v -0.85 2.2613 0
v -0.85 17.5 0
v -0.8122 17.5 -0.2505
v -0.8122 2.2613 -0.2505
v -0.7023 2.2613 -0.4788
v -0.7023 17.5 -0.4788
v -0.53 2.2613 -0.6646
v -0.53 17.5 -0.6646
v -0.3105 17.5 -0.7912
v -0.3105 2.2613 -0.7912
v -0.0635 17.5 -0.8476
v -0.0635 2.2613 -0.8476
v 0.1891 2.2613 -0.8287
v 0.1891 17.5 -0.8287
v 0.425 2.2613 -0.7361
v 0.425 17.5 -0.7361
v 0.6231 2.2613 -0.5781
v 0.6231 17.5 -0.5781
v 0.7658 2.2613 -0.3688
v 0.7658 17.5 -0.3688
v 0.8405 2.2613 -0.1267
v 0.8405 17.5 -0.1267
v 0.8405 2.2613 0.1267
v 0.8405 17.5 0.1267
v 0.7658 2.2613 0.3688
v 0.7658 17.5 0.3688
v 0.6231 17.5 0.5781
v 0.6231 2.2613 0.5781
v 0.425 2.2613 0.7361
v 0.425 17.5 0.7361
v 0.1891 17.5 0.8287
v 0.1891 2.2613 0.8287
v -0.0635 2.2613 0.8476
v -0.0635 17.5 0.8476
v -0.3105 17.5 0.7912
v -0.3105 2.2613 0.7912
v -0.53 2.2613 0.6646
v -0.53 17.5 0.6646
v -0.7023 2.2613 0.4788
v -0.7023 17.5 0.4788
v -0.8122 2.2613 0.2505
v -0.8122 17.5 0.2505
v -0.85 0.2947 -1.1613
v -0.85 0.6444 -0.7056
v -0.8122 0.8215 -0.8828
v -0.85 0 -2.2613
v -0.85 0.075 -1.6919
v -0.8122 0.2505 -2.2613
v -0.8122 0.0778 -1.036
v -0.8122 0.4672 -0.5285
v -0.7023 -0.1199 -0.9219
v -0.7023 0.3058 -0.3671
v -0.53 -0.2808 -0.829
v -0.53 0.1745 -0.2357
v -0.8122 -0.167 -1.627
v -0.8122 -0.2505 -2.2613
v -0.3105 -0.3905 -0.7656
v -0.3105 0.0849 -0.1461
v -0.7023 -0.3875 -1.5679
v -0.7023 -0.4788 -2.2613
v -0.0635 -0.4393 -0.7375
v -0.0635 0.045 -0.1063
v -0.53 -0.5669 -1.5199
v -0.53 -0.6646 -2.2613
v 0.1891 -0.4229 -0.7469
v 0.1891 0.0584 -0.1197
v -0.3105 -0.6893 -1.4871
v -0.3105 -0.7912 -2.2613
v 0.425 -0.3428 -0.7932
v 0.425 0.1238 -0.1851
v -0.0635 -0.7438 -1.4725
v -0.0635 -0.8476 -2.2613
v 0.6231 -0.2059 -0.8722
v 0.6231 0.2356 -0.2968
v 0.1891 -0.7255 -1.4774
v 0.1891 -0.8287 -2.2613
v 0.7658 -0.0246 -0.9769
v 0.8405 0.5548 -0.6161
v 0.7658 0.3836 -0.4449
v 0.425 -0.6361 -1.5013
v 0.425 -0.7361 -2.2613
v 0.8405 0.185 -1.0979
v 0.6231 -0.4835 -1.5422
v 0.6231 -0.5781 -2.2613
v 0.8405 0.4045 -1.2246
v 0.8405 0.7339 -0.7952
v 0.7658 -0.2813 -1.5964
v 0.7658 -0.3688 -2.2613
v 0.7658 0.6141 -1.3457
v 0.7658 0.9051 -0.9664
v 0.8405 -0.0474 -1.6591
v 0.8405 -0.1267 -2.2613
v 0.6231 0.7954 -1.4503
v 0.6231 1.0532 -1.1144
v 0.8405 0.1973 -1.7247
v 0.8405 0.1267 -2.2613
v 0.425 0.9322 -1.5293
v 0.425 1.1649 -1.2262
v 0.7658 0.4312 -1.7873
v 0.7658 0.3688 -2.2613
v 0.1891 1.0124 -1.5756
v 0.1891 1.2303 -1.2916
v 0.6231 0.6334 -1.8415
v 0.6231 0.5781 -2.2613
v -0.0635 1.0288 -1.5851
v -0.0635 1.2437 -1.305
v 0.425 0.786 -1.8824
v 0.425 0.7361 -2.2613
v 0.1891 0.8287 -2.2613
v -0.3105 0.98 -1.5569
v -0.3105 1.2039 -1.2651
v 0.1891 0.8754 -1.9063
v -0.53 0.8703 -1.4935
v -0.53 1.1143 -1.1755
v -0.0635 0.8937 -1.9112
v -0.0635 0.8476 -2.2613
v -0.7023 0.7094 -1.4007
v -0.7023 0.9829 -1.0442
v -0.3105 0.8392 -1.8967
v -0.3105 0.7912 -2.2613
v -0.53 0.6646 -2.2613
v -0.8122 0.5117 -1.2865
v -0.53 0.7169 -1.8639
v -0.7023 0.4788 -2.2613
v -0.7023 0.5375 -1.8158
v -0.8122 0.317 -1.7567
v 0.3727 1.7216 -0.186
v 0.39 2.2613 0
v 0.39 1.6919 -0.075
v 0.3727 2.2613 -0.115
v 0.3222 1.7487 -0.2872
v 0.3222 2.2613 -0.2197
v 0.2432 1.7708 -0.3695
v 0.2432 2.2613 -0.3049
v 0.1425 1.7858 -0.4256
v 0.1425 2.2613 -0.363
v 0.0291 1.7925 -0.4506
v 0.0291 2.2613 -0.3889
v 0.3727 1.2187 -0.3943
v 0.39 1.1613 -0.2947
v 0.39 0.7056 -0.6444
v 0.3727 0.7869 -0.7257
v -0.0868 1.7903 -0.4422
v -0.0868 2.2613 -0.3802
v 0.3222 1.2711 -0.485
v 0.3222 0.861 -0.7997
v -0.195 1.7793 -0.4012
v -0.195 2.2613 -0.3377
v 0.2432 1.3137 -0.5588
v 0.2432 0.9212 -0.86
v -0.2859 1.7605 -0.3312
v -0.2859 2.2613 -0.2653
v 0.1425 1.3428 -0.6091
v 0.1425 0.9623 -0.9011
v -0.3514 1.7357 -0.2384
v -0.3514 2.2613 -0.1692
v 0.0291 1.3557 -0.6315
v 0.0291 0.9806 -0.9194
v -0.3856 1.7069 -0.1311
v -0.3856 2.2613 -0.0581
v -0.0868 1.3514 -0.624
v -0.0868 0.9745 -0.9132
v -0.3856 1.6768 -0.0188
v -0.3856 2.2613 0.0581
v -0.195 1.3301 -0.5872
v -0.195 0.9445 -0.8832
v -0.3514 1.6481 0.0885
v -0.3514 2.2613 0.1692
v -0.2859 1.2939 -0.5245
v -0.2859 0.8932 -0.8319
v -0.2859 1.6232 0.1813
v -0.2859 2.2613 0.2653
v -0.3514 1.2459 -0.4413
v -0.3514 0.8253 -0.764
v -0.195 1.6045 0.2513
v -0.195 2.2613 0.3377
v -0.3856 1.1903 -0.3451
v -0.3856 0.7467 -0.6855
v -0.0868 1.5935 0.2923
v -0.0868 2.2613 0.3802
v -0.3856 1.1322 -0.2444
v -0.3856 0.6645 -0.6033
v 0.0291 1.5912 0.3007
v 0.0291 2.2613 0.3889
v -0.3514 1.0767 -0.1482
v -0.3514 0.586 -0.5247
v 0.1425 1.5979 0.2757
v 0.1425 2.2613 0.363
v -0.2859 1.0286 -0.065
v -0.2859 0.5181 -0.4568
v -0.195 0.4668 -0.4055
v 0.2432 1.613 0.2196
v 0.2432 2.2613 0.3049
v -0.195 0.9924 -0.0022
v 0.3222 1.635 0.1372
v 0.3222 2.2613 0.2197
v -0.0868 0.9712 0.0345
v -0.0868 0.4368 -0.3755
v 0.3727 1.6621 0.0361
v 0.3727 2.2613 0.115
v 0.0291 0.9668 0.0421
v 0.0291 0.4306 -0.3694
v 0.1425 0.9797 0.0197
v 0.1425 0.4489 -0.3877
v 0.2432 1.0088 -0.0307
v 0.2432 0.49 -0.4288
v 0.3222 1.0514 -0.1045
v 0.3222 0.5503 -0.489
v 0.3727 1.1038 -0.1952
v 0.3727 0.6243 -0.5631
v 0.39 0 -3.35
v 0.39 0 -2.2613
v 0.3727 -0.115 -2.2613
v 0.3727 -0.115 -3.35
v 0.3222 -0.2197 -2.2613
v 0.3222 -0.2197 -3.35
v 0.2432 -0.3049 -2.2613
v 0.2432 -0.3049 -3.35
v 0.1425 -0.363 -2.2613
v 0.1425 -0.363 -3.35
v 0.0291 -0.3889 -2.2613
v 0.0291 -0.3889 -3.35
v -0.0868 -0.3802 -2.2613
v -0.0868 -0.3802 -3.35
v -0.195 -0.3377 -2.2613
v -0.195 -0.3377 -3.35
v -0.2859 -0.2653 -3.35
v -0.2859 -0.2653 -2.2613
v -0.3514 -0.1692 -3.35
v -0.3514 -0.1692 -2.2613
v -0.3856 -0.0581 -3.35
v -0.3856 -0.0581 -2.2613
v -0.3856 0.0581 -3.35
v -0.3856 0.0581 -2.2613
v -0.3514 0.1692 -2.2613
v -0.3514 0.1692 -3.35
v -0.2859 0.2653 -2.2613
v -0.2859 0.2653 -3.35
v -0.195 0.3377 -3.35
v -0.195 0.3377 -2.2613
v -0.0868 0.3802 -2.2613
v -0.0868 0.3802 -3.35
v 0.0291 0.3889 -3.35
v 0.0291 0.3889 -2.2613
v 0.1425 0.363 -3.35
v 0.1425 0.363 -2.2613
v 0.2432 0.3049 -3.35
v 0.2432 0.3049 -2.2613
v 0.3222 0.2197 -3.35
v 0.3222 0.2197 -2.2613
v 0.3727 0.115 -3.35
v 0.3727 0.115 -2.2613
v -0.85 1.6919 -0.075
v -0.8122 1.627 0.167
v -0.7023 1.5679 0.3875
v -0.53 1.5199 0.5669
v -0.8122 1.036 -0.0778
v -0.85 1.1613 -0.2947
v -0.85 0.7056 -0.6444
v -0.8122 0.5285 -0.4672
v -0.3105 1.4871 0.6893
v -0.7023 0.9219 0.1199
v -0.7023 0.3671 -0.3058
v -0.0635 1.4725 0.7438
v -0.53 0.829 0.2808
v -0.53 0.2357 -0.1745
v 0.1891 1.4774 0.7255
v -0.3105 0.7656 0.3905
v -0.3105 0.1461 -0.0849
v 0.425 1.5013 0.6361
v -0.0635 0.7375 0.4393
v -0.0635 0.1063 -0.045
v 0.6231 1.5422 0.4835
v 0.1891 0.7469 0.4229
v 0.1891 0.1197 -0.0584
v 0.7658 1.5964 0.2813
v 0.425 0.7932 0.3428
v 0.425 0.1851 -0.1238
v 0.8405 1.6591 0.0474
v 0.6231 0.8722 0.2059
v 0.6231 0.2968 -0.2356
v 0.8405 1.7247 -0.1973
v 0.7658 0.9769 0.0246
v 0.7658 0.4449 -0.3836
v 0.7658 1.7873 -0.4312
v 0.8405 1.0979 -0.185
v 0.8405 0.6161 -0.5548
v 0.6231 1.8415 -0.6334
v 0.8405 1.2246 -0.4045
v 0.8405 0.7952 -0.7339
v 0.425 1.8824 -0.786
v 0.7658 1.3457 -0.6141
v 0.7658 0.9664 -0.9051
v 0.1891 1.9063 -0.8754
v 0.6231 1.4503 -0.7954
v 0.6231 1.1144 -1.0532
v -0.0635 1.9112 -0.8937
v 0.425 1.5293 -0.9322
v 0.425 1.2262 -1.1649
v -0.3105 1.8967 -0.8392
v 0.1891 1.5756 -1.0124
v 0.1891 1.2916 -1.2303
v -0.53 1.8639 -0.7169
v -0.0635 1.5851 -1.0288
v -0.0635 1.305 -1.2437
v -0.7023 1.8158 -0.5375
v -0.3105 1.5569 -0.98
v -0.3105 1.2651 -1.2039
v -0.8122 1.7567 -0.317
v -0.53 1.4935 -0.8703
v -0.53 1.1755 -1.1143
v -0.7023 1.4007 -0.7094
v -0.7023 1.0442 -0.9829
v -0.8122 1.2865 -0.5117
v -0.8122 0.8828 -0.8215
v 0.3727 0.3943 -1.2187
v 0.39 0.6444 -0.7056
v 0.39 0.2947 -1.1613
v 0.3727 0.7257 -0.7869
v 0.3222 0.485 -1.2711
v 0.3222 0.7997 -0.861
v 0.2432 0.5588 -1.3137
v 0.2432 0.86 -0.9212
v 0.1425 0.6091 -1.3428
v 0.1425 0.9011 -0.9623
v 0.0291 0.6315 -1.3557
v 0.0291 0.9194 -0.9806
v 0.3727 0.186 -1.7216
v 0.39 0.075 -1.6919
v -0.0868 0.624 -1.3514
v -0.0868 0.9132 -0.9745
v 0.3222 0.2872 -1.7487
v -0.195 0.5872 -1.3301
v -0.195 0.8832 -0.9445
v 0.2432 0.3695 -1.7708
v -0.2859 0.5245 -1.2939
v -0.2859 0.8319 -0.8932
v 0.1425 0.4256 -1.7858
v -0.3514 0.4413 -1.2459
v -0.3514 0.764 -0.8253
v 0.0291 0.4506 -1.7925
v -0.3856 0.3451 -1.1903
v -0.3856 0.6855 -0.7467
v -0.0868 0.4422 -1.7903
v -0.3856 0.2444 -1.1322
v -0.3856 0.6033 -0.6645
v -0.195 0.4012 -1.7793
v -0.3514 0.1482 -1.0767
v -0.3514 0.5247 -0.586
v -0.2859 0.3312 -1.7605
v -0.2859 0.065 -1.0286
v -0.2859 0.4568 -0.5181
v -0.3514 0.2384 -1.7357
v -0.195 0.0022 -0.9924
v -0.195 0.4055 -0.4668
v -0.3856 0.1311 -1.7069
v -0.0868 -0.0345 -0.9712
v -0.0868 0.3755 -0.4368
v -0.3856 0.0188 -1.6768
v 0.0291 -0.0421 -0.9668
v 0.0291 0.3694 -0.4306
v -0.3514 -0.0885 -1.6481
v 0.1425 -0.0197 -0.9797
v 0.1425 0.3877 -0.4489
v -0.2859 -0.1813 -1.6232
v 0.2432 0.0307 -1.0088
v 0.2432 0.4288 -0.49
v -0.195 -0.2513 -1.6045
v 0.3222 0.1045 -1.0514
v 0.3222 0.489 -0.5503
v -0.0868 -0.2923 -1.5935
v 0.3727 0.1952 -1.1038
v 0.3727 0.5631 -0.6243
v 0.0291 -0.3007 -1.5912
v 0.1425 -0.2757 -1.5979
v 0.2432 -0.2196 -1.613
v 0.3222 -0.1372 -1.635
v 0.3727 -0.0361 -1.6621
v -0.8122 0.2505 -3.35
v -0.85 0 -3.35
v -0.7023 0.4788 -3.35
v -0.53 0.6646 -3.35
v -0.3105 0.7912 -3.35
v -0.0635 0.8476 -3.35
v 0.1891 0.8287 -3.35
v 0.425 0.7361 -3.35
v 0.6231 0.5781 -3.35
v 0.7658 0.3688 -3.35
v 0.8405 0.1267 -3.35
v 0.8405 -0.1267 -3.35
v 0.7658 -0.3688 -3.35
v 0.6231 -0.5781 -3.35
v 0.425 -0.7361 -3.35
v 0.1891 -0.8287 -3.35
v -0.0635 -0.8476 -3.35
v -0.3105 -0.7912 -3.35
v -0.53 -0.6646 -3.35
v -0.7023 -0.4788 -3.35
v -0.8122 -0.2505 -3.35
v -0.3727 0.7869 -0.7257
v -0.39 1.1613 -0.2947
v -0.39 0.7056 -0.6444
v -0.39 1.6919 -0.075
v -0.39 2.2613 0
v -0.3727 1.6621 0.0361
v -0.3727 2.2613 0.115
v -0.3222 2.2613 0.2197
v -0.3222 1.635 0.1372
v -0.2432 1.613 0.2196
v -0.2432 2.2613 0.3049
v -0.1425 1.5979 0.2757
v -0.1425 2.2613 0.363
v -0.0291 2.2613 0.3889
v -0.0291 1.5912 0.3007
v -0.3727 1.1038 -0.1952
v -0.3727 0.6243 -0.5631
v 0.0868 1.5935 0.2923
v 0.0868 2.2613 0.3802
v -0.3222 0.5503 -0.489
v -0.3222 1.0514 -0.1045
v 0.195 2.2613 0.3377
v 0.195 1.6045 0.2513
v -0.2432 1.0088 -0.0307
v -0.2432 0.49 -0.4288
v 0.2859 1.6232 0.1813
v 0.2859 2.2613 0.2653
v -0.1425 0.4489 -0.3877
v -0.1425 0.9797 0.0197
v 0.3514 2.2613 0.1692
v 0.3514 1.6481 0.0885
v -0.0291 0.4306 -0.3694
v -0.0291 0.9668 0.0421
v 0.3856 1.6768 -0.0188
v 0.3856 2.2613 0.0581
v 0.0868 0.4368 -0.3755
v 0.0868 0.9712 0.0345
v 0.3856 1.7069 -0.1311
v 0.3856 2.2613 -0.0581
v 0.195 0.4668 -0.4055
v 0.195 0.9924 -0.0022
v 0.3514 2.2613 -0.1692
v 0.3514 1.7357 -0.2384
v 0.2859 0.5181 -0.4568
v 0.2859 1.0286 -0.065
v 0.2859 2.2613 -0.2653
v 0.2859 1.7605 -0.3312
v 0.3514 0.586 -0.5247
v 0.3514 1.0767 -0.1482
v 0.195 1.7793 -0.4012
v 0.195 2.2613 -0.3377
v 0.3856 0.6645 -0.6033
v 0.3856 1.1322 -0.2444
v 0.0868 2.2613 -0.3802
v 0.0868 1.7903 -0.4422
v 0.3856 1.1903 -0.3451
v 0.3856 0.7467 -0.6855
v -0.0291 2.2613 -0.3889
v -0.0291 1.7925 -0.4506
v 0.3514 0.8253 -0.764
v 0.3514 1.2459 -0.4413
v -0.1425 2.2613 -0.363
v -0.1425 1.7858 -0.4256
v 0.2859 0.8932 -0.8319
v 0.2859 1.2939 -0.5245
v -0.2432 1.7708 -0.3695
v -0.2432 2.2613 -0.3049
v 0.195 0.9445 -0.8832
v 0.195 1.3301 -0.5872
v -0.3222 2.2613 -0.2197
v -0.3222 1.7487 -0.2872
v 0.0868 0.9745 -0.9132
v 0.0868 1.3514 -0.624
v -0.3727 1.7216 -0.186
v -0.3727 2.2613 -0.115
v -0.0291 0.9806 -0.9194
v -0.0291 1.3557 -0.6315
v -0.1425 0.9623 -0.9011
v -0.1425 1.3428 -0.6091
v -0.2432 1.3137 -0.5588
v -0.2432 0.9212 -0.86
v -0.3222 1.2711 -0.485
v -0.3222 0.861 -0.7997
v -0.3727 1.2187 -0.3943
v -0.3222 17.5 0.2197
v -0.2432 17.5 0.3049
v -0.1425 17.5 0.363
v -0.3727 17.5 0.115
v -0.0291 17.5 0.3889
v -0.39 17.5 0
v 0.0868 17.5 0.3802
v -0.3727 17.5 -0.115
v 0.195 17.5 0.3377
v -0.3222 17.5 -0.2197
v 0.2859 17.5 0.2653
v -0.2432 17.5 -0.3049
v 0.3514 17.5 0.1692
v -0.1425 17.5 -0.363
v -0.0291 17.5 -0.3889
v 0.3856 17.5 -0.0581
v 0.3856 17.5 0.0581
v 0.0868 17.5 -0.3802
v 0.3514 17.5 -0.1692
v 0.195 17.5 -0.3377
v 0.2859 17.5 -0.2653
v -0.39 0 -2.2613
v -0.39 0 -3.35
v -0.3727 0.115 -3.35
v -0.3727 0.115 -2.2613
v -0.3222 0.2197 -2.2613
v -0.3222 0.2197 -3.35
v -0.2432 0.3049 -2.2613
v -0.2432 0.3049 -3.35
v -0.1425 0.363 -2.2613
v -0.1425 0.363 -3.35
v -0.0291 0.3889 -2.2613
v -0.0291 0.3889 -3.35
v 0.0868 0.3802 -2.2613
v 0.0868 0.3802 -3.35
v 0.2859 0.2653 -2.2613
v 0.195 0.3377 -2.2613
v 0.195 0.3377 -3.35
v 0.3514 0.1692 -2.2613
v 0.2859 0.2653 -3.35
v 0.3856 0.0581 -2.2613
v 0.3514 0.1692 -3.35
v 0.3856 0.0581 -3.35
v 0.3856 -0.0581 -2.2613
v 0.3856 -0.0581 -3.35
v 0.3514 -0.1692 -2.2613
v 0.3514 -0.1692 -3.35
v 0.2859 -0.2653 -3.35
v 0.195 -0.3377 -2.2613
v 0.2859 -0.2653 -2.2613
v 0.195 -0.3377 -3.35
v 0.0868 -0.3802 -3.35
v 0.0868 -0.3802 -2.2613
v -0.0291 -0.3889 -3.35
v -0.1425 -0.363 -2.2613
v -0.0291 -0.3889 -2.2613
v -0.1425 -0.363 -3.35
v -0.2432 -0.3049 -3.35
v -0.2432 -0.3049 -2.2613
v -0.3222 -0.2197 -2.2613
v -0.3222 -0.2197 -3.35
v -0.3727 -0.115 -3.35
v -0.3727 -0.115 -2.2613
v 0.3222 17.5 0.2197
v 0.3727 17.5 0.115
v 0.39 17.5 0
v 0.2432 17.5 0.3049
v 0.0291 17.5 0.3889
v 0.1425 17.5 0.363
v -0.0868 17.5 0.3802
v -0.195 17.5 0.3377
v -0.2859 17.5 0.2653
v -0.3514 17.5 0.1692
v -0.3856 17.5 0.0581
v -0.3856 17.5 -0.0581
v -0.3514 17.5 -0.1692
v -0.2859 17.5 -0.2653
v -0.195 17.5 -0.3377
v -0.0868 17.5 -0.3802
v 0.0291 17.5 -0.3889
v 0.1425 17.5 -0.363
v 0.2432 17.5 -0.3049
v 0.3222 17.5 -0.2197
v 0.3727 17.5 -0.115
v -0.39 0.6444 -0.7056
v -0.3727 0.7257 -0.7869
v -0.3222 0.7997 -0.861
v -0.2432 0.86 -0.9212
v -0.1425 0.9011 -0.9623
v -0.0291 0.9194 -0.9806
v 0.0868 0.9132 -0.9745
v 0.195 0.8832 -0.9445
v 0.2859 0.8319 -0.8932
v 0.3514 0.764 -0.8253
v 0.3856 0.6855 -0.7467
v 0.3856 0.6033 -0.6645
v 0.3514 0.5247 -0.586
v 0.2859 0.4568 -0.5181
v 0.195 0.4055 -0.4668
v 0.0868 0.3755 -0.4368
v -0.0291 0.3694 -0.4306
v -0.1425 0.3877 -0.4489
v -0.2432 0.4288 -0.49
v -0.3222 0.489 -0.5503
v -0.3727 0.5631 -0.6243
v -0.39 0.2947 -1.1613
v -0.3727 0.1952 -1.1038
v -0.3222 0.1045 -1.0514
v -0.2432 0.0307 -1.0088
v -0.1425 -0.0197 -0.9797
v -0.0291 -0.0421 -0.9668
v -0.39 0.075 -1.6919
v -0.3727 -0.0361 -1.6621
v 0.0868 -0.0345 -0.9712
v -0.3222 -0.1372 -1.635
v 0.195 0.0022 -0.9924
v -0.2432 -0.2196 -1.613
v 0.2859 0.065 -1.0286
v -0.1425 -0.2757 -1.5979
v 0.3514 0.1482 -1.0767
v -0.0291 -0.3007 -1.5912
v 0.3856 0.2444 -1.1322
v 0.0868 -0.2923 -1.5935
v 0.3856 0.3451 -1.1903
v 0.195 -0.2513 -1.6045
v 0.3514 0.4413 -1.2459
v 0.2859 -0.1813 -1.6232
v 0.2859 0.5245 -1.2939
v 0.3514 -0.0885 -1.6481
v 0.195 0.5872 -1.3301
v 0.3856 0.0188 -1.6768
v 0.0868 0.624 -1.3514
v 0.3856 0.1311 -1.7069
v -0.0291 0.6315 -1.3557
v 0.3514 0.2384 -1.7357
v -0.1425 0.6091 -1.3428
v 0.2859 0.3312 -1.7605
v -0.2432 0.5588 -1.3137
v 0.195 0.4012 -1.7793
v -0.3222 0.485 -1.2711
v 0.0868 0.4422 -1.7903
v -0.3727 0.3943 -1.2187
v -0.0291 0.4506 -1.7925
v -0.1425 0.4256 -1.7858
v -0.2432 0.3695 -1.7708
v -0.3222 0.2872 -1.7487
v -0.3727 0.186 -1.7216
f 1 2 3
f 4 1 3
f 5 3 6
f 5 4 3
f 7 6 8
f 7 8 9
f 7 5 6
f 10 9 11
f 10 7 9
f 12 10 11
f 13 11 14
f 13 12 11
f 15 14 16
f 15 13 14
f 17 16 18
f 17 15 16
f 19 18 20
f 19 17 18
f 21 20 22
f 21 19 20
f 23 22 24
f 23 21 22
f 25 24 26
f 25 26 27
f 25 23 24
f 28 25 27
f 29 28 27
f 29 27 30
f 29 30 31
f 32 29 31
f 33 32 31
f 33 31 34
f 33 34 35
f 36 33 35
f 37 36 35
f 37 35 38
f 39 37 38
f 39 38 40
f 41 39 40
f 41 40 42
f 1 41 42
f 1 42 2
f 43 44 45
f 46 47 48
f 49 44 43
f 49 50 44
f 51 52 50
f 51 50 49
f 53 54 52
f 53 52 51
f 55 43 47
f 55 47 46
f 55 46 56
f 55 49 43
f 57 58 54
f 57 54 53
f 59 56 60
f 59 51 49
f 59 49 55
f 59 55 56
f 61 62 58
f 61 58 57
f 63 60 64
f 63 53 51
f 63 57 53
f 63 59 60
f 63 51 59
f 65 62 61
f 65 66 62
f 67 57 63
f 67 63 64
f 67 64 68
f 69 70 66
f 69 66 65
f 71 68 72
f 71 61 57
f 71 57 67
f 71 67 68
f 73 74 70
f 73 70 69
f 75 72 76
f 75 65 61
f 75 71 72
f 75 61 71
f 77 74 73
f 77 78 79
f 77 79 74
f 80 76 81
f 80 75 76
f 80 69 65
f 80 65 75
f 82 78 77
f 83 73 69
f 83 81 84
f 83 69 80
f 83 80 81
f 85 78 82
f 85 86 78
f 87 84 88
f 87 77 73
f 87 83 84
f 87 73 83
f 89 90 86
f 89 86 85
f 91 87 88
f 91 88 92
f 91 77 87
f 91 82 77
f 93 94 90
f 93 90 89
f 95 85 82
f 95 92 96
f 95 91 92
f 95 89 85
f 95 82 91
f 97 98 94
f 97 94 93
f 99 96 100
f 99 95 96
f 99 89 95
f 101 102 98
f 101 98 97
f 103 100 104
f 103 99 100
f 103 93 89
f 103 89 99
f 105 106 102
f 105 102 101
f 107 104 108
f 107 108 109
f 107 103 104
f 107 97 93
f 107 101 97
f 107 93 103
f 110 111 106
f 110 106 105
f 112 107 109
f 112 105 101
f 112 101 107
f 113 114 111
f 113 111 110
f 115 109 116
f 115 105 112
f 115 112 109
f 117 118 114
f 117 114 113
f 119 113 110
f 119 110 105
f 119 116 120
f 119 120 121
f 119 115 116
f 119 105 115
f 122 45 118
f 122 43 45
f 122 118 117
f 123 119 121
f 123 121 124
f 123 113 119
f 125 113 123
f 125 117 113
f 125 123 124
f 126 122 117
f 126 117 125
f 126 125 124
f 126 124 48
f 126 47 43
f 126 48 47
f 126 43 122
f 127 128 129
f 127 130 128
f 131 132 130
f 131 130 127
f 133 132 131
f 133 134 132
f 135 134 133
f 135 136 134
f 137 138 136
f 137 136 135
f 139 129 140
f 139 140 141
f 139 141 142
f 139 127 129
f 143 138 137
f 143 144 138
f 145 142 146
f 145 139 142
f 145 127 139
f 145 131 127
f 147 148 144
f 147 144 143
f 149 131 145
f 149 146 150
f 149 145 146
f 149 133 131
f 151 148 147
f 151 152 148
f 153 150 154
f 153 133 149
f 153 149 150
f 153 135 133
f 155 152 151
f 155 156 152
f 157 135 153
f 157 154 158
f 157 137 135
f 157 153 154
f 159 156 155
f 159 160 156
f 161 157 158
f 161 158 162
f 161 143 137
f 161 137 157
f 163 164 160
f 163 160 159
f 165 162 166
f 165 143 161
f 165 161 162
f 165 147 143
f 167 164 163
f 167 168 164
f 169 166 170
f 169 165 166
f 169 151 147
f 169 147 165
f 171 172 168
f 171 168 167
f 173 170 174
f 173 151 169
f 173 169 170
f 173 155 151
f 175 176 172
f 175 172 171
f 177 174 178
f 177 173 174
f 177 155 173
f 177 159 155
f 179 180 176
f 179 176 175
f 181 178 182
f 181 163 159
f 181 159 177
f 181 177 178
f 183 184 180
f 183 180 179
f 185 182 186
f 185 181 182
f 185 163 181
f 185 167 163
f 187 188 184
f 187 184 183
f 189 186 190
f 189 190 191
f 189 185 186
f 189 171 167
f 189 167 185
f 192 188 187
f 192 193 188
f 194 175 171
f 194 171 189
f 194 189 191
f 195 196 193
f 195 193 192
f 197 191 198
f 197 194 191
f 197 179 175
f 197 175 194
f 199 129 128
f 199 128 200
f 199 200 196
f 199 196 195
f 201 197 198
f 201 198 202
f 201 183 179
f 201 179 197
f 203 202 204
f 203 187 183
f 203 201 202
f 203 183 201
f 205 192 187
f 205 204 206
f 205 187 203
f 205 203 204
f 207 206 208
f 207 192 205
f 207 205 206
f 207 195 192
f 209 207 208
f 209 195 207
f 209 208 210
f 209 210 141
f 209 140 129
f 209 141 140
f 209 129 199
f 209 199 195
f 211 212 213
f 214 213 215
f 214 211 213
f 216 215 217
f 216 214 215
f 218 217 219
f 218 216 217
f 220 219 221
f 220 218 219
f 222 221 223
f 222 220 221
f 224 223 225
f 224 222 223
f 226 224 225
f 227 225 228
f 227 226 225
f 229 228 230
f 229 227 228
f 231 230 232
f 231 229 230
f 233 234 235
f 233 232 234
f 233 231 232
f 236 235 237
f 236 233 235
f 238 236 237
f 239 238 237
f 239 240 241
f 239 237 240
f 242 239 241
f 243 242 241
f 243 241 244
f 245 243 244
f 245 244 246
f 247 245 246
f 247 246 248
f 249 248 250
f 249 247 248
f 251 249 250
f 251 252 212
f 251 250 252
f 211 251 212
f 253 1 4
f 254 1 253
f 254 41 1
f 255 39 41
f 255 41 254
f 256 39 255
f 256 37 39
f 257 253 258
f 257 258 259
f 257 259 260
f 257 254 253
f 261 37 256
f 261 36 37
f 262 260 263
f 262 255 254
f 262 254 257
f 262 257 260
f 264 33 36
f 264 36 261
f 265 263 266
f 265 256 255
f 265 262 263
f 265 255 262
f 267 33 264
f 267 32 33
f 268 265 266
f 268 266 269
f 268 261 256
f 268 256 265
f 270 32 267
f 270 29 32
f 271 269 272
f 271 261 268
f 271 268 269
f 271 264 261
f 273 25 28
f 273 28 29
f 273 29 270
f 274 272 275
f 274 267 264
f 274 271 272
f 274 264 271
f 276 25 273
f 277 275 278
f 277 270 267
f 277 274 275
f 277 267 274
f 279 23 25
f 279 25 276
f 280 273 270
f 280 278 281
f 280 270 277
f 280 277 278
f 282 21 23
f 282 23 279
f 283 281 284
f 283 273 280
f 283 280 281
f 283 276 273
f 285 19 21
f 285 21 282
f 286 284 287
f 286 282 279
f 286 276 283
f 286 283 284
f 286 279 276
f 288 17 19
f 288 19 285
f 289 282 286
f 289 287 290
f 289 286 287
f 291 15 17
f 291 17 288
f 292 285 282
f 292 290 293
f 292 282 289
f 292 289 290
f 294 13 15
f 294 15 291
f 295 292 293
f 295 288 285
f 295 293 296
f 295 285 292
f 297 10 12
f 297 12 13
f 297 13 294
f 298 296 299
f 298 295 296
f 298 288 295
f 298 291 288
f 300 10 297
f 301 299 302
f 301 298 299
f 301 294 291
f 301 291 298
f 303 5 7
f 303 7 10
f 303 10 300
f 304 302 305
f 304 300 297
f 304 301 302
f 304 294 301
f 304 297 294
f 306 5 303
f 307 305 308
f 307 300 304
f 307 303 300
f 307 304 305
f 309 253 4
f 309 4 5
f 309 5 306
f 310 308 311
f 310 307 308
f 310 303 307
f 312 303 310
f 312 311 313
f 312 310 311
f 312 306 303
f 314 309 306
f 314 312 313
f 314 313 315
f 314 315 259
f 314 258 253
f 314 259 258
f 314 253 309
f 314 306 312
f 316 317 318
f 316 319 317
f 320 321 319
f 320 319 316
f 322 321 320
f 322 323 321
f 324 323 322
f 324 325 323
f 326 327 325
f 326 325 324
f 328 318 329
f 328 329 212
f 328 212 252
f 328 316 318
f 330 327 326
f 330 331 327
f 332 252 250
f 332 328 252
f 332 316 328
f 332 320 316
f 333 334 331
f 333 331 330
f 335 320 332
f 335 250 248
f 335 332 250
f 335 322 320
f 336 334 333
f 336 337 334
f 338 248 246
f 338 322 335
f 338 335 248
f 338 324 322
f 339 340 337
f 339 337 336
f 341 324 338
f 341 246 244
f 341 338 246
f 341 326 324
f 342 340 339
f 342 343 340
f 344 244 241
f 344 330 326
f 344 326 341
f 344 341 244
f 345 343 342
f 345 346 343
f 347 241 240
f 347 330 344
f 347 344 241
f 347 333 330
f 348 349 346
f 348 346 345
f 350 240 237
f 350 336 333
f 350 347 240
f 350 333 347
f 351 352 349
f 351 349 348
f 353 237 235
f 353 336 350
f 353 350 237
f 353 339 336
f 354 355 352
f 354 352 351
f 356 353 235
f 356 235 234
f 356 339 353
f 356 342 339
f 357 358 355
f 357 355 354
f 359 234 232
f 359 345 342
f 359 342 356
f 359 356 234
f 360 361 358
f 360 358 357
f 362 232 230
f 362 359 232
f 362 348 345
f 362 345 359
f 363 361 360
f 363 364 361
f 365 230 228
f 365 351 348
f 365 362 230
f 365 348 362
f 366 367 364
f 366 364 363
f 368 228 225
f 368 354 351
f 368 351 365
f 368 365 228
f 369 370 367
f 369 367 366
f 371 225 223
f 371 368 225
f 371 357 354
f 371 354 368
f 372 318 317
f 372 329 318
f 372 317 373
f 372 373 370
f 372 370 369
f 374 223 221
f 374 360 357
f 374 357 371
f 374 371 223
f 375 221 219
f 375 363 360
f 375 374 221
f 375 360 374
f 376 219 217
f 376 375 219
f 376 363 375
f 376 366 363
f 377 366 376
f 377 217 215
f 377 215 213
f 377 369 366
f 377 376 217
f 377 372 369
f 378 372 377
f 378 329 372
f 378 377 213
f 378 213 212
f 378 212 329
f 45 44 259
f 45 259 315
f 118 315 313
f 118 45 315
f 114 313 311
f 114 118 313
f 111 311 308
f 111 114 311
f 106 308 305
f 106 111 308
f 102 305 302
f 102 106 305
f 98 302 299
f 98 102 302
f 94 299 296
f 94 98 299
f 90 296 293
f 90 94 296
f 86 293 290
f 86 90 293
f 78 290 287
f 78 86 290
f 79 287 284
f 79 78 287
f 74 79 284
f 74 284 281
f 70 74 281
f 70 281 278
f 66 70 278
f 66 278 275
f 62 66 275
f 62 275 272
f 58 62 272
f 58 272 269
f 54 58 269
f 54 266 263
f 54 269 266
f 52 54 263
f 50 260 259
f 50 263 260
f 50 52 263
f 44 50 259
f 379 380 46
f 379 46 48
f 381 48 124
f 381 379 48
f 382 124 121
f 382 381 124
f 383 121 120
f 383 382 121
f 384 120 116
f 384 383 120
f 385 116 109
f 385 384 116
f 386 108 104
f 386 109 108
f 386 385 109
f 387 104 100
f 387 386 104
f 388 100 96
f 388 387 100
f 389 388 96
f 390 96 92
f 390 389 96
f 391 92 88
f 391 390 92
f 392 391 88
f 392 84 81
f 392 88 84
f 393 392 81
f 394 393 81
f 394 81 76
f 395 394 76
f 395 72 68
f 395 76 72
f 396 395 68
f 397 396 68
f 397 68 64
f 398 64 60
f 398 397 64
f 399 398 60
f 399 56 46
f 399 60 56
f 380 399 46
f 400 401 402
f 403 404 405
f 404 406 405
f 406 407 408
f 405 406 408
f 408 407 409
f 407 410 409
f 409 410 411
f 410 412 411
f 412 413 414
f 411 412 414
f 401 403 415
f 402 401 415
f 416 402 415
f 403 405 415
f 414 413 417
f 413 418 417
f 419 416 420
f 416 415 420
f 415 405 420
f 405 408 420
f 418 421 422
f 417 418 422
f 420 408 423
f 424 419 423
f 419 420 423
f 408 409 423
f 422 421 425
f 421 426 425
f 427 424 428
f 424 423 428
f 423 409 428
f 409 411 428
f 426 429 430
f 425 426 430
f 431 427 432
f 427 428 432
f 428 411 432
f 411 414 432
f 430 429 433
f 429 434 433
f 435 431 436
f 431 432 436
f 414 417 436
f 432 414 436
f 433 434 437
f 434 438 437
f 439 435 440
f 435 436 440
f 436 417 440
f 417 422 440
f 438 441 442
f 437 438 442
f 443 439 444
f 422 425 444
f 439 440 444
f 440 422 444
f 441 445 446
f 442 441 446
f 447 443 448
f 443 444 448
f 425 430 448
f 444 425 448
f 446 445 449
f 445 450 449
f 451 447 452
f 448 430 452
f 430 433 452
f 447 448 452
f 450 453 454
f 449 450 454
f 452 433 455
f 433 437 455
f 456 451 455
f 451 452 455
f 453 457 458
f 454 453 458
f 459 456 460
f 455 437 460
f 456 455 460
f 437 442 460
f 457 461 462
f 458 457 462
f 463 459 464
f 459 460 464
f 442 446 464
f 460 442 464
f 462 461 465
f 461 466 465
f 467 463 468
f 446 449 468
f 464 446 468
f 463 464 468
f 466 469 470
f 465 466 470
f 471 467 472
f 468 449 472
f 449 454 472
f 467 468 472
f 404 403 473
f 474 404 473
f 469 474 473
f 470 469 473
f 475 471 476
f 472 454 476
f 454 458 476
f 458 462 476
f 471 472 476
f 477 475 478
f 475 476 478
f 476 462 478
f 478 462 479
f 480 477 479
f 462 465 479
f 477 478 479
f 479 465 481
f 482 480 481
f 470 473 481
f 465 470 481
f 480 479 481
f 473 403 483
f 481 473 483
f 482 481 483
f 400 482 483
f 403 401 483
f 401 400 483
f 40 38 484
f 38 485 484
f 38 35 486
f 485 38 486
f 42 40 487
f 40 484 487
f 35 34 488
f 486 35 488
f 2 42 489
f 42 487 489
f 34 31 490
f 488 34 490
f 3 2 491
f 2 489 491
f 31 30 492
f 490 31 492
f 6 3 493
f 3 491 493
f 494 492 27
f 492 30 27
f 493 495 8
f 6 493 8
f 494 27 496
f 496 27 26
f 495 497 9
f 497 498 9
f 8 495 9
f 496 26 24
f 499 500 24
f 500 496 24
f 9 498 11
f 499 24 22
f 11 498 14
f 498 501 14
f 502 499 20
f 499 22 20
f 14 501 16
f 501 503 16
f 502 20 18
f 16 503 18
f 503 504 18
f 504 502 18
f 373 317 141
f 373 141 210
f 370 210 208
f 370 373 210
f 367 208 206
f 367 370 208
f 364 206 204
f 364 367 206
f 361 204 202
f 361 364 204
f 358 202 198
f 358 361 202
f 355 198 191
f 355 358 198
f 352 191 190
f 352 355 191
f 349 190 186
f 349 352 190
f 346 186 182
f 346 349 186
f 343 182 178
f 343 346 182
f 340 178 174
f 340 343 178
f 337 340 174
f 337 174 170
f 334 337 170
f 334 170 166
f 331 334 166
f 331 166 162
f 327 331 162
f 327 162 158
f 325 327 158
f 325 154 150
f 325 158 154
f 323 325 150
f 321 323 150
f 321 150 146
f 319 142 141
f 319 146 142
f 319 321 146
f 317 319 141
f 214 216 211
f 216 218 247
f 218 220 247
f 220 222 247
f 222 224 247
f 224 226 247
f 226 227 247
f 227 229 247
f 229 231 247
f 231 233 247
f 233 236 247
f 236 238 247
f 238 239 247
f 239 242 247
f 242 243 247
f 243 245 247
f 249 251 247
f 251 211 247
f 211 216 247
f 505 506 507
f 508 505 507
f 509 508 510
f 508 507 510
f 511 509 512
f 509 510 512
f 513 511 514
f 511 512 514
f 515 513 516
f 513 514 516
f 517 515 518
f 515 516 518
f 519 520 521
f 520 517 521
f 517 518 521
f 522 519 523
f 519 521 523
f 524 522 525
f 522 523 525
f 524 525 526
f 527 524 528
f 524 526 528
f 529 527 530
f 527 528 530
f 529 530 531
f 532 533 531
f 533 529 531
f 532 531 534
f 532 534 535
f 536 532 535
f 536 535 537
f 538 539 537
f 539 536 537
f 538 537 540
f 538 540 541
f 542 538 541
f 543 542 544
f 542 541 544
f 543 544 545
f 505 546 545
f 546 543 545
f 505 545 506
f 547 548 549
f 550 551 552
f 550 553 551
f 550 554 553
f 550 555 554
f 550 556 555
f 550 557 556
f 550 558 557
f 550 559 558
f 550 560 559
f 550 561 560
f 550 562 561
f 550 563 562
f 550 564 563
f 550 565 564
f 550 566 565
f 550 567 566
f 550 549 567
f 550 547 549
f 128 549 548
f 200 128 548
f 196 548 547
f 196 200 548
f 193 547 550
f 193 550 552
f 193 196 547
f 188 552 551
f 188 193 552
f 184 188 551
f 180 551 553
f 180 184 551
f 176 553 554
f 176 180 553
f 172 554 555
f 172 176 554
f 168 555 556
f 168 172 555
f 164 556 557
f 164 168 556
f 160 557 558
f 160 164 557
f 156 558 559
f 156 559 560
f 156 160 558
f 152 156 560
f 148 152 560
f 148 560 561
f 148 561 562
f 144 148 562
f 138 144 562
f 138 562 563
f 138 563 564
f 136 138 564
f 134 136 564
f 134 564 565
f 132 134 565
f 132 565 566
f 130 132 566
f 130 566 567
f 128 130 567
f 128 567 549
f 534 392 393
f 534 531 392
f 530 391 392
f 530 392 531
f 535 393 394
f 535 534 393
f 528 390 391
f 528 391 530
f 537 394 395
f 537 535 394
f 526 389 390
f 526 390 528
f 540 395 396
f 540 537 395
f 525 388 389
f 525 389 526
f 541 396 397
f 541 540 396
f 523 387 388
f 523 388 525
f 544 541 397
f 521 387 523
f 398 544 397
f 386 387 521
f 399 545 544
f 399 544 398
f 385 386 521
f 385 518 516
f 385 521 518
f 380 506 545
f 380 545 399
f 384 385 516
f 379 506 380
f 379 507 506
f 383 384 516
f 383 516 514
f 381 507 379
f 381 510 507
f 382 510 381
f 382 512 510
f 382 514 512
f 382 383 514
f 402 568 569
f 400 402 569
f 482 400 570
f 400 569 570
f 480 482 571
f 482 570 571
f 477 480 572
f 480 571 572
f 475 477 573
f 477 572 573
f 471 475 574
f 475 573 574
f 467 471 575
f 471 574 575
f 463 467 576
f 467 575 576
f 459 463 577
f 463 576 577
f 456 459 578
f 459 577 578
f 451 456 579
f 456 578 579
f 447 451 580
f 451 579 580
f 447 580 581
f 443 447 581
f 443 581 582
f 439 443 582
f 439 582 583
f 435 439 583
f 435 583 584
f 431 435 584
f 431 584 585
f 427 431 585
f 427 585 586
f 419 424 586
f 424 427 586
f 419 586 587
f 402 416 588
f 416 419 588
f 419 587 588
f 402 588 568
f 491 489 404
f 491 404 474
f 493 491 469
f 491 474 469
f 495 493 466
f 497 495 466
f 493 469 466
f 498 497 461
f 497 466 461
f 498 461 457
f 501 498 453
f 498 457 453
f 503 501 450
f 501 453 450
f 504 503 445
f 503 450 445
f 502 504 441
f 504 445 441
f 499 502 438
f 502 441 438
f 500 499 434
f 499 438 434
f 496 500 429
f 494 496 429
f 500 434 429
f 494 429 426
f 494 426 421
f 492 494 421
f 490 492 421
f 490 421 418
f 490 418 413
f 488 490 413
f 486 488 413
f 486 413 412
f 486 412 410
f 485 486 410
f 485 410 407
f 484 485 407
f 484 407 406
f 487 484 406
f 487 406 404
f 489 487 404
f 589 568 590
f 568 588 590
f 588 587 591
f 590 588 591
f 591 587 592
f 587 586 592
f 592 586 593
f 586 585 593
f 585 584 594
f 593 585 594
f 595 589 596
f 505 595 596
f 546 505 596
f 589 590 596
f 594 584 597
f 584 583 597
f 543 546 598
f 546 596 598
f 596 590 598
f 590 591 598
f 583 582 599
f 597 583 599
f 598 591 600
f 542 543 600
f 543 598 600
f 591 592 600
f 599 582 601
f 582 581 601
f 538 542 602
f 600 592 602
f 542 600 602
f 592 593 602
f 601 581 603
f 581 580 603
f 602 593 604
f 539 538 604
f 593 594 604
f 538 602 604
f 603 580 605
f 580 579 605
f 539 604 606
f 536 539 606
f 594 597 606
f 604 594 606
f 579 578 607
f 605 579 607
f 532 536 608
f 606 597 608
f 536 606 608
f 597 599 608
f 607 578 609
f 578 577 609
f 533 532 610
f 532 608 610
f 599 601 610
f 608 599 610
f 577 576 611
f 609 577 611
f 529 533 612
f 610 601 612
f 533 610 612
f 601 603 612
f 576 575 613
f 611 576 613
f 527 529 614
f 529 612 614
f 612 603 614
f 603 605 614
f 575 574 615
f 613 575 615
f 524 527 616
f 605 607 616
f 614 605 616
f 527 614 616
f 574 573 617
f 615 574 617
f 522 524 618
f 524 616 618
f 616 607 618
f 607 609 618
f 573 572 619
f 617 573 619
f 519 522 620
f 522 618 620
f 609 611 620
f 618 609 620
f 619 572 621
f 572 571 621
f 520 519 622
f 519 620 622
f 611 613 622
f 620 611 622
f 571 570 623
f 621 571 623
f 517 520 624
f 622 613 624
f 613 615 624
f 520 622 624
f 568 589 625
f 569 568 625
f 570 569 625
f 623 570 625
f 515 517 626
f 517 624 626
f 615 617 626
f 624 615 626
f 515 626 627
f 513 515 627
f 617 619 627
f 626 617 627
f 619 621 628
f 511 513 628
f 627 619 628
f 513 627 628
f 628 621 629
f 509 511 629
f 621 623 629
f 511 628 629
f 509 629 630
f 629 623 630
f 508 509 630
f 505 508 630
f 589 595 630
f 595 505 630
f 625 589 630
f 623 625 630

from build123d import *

# Parameters (mm, degrees)
SKETCH_2_R   = 0.39
SKETCH_3_R   = 0.85
SKETCH_3_R_2 = 0.39


with BuildPart() as part:
    # По траектории1: sweep along a path in Эскиз1
    with BuildLine(Plane(origin=(0, 0, 0), x_dir=(0, 0, -1), z_dir=(1, 0, 0))) as sweep_1_path:
        Line((0, 17.49999984), (0, 2.26126984))
        ThreePointArc((0, 2.26126984), (0.167465028, 1.419366289), (0.644365081, 0.705634921))
        Line((0.644365081, 0.705634921), (0.705634921, 0.644365081))
        ThreePointArc((0.705634921, 0.644365081), (1.419366289, 0.167465028), (2.26126984, 0))
        Line((2.26126984, 0), (3.35, 0))
    # Эскиз2 → По траектории1 (sweep)
    with BuildSketch(Plane.XY.offset(-3.35)):
        Circle(SKETCH_2_R)
    sweep(path=sweep_1_path.line)


with BuildPart() as body_2:
    # По траектории2: sweep along a path in Эскиз1<2>
    with BuildLine(Plane(origin=(0, 0, 0), x_dir=(0, 0, -1), z_dir=(1, 0, 0))) as sweep_2_path:
        Line((0, 17.49999984), (0, 2.26126984))
        ThreePointArc((0, 2.26126984), (0.167465028, 1.419366289), (0.644365081, 0.705634921))
        Line((0.644365081, 0.705634921), (0.705634921, 0.644365081))
        ThreePointArc((0.705634921, 0.644365081), (1.419366289, 0.167465028), (2.26126984, 0))
        Line((2.26126984, 0), (3.35, 0))
    # Эскиз3 → По траектории2 (sweep)
    with BuildSketch(Plane(origin=(0, 0, -3.35), x_dir=(-1, 0, 0), z_dir=(0, 0, -1))):
        Circle(SKETCH_3_R)
        Circle(SKETCH_3_R_2, mode=Mode.SUBTRACT)
    sweep(path=sweep_2_path.line)


solid = Compound([part.part, body_2.part])
